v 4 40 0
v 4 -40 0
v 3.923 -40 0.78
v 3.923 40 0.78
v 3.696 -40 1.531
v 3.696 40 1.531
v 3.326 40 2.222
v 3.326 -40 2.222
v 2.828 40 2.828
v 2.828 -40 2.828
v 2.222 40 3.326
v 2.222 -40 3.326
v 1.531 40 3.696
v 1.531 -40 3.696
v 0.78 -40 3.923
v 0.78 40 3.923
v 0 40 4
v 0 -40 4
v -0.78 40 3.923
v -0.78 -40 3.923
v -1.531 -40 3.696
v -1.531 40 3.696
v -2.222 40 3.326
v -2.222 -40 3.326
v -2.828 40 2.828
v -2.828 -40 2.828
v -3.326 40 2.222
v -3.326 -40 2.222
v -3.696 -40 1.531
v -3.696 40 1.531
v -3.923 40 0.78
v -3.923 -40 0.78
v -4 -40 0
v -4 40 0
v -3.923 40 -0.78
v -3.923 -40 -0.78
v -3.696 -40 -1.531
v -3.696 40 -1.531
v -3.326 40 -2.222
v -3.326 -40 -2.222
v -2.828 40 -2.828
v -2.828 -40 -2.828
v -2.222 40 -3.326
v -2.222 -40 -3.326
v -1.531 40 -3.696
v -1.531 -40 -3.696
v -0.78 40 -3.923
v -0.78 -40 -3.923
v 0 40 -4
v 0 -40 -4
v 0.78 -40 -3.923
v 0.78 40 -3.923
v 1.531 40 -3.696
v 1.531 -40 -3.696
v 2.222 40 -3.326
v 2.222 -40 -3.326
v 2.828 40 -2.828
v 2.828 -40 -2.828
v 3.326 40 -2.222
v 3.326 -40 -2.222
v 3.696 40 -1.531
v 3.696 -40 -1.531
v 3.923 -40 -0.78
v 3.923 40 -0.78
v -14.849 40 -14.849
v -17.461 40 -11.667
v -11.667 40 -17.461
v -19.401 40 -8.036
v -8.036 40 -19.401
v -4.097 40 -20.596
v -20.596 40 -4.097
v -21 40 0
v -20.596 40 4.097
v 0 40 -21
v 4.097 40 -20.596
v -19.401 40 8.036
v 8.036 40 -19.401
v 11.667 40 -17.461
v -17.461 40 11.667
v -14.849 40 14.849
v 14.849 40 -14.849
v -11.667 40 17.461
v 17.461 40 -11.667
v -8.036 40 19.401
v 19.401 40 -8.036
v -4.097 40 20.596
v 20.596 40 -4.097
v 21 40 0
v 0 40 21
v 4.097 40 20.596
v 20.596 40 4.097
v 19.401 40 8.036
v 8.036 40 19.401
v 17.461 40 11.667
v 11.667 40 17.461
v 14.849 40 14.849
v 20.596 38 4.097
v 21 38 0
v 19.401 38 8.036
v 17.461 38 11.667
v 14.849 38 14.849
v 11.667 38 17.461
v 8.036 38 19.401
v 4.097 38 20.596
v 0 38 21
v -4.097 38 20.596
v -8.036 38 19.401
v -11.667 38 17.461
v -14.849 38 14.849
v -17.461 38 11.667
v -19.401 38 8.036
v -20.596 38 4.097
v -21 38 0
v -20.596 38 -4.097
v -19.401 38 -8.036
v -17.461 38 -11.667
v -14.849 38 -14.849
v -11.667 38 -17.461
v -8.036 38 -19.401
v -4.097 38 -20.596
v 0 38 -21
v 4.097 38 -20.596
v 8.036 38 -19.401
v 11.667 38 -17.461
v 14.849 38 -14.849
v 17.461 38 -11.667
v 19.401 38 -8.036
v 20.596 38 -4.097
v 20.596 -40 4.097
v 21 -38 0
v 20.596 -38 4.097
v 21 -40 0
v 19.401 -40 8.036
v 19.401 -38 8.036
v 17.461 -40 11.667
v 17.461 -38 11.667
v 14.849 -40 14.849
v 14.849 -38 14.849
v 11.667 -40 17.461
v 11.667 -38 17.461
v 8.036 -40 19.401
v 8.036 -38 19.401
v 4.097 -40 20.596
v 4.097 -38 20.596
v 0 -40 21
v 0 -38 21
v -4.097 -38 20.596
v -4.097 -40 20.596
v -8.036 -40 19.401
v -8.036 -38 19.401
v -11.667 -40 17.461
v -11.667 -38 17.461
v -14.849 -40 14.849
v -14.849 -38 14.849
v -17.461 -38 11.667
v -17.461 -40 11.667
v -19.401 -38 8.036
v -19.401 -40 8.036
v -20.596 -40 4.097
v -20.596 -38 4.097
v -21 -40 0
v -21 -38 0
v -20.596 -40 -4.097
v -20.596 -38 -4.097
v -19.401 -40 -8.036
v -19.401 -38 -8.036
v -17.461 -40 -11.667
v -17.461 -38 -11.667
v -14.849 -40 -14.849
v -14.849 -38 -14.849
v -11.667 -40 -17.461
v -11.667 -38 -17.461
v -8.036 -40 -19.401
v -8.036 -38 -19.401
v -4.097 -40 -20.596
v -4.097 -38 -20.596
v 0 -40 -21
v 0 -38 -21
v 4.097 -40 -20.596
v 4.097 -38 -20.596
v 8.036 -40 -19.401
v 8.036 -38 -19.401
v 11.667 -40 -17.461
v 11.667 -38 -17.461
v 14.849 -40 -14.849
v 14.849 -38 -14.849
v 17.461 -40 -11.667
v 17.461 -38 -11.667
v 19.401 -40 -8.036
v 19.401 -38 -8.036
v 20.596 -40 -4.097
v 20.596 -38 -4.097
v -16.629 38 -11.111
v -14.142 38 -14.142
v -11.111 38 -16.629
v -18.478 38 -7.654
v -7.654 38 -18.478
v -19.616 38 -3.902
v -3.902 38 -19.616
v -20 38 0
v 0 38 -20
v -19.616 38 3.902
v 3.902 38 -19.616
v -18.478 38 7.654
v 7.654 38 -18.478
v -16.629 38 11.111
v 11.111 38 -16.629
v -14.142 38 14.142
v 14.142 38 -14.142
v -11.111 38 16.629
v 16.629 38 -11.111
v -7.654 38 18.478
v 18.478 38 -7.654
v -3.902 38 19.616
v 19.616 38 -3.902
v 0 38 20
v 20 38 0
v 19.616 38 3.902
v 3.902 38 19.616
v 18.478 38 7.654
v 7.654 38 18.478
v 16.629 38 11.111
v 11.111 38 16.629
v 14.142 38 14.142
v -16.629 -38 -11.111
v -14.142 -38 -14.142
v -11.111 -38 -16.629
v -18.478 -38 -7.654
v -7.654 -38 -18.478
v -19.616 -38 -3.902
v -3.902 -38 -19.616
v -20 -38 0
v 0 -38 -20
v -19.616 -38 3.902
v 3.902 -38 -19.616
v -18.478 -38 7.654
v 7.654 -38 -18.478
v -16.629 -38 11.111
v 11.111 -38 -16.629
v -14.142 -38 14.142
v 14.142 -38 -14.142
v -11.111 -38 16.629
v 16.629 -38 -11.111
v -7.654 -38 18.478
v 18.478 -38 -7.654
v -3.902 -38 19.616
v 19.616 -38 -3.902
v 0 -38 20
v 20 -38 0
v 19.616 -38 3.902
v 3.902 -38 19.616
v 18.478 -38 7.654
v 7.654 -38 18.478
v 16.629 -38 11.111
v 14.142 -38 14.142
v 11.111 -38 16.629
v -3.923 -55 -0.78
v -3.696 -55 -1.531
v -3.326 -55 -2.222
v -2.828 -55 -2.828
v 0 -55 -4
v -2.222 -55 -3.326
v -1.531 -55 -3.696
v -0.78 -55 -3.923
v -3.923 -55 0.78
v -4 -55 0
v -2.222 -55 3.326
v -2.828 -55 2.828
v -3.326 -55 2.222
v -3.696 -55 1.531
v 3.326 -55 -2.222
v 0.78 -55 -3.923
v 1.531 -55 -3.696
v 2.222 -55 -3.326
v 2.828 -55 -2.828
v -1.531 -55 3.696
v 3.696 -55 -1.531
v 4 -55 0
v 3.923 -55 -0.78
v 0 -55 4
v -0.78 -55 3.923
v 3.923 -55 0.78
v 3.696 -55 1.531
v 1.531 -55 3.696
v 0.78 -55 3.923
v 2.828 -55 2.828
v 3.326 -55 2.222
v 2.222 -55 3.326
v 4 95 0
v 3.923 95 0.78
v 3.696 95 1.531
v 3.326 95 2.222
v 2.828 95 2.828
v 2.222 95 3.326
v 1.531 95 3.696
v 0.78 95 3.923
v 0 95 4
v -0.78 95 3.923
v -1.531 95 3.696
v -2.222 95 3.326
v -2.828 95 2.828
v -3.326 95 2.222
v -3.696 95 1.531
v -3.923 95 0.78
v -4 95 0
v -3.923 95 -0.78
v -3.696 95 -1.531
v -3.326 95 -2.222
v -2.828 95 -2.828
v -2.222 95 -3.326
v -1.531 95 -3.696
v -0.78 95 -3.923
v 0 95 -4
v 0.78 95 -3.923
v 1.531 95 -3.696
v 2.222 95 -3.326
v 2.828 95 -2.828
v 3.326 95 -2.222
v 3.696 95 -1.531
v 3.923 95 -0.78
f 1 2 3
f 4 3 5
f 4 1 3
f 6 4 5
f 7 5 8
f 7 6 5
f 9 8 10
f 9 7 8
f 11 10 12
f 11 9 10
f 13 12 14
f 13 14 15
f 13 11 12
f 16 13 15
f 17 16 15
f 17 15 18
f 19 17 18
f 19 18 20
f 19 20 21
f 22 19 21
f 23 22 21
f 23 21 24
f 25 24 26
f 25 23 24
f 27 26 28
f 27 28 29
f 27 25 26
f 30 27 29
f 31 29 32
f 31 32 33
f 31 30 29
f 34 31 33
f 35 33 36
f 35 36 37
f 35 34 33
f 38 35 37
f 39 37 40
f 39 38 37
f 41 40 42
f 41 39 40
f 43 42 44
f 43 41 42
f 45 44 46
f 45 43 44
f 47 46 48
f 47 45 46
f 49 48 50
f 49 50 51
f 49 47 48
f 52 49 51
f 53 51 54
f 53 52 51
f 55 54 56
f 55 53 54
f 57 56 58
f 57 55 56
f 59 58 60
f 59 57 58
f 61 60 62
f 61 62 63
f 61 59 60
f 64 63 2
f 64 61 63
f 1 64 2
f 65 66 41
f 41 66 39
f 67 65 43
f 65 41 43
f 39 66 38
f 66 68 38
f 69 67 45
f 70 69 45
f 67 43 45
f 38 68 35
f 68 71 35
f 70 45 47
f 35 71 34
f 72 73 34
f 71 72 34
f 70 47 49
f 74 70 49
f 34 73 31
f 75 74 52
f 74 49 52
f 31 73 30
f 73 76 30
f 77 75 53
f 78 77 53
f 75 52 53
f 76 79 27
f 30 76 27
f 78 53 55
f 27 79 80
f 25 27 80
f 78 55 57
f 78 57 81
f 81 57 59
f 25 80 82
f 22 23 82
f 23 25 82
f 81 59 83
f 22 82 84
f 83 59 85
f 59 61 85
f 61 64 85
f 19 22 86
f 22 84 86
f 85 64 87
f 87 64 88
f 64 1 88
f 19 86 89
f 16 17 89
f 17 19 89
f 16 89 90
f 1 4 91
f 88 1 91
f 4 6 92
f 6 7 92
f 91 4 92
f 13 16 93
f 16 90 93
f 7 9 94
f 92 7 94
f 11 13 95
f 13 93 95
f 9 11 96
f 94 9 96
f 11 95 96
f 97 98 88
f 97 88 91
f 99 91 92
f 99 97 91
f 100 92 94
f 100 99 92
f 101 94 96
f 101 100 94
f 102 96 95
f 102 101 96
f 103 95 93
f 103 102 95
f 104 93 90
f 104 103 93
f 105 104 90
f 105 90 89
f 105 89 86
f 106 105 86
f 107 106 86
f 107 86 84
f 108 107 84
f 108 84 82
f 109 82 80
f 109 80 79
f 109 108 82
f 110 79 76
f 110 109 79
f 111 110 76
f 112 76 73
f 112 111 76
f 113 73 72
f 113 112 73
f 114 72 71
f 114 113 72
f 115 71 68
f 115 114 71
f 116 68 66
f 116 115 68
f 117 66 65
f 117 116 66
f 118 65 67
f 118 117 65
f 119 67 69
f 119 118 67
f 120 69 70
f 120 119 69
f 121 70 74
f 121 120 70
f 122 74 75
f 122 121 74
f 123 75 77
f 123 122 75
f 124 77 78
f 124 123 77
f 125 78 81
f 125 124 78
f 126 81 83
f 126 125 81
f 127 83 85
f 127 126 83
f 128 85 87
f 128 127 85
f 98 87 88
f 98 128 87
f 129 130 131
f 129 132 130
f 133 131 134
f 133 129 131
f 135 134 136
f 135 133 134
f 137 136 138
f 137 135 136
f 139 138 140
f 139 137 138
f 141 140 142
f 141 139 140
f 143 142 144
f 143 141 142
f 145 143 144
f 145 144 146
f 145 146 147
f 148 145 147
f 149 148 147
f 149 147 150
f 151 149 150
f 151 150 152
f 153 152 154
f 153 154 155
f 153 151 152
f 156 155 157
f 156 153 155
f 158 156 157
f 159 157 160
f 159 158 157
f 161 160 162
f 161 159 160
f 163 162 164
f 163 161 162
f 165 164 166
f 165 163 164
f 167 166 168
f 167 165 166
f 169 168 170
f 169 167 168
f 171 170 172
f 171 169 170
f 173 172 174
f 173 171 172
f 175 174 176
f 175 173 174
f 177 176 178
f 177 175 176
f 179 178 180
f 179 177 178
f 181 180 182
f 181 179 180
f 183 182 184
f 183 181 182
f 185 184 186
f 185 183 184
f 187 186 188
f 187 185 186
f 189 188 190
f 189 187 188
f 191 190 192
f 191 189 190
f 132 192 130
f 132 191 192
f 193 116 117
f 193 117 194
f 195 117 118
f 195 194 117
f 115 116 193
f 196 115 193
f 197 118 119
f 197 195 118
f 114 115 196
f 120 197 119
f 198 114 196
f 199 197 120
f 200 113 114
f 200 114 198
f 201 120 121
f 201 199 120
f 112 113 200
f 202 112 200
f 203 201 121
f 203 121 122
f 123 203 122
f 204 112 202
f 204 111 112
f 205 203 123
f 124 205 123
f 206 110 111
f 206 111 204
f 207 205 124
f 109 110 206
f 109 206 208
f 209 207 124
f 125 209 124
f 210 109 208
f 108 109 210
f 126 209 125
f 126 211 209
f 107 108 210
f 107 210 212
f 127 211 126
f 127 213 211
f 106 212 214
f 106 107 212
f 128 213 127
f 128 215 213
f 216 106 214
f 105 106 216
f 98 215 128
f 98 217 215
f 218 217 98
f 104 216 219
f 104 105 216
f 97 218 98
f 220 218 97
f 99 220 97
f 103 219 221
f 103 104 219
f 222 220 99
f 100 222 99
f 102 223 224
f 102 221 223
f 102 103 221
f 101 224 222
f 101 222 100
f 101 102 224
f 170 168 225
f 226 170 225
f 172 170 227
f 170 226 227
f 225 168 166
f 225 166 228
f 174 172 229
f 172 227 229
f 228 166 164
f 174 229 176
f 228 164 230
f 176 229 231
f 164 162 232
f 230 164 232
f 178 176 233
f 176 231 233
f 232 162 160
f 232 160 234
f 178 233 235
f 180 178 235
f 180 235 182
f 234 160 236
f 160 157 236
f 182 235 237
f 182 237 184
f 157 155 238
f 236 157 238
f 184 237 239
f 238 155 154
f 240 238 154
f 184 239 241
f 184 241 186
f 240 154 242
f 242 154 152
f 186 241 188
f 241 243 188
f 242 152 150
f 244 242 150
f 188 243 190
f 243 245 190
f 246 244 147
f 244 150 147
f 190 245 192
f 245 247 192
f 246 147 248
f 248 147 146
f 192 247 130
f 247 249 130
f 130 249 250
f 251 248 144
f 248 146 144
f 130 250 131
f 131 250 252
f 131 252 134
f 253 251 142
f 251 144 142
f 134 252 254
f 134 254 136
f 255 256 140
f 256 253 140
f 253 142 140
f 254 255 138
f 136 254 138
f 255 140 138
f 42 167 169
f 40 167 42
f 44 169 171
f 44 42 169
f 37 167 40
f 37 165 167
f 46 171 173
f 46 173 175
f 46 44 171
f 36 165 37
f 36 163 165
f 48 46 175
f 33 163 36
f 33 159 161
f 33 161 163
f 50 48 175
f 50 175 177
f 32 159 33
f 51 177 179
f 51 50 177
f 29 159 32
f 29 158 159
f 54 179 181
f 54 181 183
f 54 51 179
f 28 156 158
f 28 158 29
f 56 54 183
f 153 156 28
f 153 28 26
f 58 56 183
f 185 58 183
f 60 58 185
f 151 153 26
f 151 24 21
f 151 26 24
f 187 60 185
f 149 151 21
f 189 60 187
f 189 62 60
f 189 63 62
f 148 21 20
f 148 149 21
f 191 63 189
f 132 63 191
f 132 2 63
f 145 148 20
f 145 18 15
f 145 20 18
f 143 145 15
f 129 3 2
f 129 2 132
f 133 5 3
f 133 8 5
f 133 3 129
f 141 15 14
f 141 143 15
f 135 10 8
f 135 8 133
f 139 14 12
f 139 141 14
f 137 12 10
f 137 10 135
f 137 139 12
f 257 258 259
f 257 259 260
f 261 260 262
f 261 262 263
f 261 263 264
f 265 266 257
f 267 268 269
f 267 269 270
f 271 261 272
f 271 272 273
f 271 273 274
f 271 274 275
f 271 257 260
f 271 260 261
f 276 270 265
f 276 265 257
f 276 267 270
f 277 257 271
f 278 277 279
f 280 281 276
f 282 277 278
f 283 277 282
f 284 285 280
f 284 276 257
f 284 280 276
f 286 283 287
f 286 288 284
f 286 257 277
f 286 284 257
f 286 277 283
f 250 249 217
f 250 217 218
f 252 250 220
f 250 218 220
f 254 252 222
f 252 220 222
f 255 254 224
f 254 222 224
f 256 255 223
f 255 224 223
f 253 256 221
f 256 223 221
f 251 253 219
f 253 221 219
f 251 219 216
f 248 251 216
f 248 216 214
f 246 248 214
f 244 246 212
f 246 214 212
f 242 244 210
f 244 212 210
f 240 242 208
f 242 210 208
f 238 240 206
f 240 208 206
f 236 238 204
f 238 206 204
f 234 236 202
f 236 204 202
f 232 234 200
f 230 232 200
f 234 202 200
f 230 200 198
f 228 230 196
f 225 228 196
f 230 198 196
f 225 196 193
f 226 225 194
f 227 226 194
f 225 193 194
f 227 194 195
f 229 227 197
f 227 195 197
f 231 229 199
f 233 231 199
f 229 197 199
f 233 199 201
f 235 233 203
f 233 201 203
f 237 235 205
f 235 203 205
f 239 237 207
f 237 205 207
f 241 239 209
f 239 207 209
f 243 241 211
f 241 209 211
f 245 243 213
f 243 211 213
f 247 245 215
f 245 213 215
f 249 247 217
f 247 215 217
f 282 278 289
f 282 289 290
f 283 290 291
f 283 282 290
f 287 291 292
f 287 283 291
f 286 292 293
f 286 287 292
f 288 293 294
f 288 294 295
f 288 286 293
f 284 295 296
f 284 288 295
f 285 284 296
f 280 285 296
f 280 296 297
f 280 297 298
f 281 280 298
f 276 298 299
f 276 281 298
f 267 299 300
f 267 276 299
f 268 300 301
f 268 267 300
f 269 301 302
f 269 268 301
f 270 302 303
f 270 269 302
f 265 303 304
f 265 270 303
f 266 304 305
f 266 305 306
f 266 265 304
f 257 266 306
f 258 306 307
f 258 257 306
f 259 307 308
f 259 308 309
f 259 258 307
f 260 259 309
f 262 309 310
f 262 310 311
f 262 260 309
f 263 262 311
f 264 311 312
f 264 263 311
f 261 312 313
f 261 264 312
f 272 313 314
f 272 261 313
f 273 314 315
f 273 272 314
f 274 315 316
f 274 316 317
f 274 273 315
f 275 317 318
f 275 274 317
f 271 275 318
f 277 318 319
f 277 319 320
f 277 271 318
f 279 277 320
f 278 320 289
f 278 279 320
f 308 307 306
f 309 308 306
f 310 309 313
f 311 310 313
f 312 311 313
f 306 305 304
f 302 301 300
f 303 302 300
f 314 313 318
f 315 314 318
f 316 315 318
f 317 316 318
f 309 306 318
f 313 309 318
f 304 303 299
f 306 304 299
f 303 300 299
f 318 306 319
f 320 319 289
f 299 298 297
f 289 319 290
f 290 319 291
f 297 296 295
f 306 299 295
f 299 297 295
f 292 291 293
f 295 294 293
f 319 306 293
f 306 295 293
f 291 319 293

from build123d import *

# Parameters (mm, degrees)
F0_R     = 21
F0_R_2   = 20
F0_R_3   = 4
F1_DEPTH = 40
F2_DEPTH = 38
F4_R     = 4
F5_DEPTH = 150


with BuildPart() as f1:
    # F0 (on Front) → F1 (new body, symmetric)
    with BuildSketch(Plane.XZ):
        Circle(F0_R)
        Circle(F0_R_2, mode=Mode.SUBTRACT)
        Circle(F0_R_2)
        Circle(F0_R_3, mode=Mode.SUBTRACT)
    extrude(amount=F1_DEPTH, both=True)

    # F0 (on Front) → F2 (cut, symmetric)
    with BuildSketch(Plane.XZ):
        Circle(F0_R)
        Circle(F0_R_2, mode=Mode.SUBTRACT)
    extrude(amount=F2_DEPTH, both=True, mode=Mode.SUBTRACT)


with BuildPart() as f5:
    # F4 (on offset) → F5 (new body)
    with BuildSketch(Plane.XZ.offset(55)):
        Circle(F4_R)
    extrude(amount=-F5_DEPTH)


solid = Compound([f1.part, f5.part])
